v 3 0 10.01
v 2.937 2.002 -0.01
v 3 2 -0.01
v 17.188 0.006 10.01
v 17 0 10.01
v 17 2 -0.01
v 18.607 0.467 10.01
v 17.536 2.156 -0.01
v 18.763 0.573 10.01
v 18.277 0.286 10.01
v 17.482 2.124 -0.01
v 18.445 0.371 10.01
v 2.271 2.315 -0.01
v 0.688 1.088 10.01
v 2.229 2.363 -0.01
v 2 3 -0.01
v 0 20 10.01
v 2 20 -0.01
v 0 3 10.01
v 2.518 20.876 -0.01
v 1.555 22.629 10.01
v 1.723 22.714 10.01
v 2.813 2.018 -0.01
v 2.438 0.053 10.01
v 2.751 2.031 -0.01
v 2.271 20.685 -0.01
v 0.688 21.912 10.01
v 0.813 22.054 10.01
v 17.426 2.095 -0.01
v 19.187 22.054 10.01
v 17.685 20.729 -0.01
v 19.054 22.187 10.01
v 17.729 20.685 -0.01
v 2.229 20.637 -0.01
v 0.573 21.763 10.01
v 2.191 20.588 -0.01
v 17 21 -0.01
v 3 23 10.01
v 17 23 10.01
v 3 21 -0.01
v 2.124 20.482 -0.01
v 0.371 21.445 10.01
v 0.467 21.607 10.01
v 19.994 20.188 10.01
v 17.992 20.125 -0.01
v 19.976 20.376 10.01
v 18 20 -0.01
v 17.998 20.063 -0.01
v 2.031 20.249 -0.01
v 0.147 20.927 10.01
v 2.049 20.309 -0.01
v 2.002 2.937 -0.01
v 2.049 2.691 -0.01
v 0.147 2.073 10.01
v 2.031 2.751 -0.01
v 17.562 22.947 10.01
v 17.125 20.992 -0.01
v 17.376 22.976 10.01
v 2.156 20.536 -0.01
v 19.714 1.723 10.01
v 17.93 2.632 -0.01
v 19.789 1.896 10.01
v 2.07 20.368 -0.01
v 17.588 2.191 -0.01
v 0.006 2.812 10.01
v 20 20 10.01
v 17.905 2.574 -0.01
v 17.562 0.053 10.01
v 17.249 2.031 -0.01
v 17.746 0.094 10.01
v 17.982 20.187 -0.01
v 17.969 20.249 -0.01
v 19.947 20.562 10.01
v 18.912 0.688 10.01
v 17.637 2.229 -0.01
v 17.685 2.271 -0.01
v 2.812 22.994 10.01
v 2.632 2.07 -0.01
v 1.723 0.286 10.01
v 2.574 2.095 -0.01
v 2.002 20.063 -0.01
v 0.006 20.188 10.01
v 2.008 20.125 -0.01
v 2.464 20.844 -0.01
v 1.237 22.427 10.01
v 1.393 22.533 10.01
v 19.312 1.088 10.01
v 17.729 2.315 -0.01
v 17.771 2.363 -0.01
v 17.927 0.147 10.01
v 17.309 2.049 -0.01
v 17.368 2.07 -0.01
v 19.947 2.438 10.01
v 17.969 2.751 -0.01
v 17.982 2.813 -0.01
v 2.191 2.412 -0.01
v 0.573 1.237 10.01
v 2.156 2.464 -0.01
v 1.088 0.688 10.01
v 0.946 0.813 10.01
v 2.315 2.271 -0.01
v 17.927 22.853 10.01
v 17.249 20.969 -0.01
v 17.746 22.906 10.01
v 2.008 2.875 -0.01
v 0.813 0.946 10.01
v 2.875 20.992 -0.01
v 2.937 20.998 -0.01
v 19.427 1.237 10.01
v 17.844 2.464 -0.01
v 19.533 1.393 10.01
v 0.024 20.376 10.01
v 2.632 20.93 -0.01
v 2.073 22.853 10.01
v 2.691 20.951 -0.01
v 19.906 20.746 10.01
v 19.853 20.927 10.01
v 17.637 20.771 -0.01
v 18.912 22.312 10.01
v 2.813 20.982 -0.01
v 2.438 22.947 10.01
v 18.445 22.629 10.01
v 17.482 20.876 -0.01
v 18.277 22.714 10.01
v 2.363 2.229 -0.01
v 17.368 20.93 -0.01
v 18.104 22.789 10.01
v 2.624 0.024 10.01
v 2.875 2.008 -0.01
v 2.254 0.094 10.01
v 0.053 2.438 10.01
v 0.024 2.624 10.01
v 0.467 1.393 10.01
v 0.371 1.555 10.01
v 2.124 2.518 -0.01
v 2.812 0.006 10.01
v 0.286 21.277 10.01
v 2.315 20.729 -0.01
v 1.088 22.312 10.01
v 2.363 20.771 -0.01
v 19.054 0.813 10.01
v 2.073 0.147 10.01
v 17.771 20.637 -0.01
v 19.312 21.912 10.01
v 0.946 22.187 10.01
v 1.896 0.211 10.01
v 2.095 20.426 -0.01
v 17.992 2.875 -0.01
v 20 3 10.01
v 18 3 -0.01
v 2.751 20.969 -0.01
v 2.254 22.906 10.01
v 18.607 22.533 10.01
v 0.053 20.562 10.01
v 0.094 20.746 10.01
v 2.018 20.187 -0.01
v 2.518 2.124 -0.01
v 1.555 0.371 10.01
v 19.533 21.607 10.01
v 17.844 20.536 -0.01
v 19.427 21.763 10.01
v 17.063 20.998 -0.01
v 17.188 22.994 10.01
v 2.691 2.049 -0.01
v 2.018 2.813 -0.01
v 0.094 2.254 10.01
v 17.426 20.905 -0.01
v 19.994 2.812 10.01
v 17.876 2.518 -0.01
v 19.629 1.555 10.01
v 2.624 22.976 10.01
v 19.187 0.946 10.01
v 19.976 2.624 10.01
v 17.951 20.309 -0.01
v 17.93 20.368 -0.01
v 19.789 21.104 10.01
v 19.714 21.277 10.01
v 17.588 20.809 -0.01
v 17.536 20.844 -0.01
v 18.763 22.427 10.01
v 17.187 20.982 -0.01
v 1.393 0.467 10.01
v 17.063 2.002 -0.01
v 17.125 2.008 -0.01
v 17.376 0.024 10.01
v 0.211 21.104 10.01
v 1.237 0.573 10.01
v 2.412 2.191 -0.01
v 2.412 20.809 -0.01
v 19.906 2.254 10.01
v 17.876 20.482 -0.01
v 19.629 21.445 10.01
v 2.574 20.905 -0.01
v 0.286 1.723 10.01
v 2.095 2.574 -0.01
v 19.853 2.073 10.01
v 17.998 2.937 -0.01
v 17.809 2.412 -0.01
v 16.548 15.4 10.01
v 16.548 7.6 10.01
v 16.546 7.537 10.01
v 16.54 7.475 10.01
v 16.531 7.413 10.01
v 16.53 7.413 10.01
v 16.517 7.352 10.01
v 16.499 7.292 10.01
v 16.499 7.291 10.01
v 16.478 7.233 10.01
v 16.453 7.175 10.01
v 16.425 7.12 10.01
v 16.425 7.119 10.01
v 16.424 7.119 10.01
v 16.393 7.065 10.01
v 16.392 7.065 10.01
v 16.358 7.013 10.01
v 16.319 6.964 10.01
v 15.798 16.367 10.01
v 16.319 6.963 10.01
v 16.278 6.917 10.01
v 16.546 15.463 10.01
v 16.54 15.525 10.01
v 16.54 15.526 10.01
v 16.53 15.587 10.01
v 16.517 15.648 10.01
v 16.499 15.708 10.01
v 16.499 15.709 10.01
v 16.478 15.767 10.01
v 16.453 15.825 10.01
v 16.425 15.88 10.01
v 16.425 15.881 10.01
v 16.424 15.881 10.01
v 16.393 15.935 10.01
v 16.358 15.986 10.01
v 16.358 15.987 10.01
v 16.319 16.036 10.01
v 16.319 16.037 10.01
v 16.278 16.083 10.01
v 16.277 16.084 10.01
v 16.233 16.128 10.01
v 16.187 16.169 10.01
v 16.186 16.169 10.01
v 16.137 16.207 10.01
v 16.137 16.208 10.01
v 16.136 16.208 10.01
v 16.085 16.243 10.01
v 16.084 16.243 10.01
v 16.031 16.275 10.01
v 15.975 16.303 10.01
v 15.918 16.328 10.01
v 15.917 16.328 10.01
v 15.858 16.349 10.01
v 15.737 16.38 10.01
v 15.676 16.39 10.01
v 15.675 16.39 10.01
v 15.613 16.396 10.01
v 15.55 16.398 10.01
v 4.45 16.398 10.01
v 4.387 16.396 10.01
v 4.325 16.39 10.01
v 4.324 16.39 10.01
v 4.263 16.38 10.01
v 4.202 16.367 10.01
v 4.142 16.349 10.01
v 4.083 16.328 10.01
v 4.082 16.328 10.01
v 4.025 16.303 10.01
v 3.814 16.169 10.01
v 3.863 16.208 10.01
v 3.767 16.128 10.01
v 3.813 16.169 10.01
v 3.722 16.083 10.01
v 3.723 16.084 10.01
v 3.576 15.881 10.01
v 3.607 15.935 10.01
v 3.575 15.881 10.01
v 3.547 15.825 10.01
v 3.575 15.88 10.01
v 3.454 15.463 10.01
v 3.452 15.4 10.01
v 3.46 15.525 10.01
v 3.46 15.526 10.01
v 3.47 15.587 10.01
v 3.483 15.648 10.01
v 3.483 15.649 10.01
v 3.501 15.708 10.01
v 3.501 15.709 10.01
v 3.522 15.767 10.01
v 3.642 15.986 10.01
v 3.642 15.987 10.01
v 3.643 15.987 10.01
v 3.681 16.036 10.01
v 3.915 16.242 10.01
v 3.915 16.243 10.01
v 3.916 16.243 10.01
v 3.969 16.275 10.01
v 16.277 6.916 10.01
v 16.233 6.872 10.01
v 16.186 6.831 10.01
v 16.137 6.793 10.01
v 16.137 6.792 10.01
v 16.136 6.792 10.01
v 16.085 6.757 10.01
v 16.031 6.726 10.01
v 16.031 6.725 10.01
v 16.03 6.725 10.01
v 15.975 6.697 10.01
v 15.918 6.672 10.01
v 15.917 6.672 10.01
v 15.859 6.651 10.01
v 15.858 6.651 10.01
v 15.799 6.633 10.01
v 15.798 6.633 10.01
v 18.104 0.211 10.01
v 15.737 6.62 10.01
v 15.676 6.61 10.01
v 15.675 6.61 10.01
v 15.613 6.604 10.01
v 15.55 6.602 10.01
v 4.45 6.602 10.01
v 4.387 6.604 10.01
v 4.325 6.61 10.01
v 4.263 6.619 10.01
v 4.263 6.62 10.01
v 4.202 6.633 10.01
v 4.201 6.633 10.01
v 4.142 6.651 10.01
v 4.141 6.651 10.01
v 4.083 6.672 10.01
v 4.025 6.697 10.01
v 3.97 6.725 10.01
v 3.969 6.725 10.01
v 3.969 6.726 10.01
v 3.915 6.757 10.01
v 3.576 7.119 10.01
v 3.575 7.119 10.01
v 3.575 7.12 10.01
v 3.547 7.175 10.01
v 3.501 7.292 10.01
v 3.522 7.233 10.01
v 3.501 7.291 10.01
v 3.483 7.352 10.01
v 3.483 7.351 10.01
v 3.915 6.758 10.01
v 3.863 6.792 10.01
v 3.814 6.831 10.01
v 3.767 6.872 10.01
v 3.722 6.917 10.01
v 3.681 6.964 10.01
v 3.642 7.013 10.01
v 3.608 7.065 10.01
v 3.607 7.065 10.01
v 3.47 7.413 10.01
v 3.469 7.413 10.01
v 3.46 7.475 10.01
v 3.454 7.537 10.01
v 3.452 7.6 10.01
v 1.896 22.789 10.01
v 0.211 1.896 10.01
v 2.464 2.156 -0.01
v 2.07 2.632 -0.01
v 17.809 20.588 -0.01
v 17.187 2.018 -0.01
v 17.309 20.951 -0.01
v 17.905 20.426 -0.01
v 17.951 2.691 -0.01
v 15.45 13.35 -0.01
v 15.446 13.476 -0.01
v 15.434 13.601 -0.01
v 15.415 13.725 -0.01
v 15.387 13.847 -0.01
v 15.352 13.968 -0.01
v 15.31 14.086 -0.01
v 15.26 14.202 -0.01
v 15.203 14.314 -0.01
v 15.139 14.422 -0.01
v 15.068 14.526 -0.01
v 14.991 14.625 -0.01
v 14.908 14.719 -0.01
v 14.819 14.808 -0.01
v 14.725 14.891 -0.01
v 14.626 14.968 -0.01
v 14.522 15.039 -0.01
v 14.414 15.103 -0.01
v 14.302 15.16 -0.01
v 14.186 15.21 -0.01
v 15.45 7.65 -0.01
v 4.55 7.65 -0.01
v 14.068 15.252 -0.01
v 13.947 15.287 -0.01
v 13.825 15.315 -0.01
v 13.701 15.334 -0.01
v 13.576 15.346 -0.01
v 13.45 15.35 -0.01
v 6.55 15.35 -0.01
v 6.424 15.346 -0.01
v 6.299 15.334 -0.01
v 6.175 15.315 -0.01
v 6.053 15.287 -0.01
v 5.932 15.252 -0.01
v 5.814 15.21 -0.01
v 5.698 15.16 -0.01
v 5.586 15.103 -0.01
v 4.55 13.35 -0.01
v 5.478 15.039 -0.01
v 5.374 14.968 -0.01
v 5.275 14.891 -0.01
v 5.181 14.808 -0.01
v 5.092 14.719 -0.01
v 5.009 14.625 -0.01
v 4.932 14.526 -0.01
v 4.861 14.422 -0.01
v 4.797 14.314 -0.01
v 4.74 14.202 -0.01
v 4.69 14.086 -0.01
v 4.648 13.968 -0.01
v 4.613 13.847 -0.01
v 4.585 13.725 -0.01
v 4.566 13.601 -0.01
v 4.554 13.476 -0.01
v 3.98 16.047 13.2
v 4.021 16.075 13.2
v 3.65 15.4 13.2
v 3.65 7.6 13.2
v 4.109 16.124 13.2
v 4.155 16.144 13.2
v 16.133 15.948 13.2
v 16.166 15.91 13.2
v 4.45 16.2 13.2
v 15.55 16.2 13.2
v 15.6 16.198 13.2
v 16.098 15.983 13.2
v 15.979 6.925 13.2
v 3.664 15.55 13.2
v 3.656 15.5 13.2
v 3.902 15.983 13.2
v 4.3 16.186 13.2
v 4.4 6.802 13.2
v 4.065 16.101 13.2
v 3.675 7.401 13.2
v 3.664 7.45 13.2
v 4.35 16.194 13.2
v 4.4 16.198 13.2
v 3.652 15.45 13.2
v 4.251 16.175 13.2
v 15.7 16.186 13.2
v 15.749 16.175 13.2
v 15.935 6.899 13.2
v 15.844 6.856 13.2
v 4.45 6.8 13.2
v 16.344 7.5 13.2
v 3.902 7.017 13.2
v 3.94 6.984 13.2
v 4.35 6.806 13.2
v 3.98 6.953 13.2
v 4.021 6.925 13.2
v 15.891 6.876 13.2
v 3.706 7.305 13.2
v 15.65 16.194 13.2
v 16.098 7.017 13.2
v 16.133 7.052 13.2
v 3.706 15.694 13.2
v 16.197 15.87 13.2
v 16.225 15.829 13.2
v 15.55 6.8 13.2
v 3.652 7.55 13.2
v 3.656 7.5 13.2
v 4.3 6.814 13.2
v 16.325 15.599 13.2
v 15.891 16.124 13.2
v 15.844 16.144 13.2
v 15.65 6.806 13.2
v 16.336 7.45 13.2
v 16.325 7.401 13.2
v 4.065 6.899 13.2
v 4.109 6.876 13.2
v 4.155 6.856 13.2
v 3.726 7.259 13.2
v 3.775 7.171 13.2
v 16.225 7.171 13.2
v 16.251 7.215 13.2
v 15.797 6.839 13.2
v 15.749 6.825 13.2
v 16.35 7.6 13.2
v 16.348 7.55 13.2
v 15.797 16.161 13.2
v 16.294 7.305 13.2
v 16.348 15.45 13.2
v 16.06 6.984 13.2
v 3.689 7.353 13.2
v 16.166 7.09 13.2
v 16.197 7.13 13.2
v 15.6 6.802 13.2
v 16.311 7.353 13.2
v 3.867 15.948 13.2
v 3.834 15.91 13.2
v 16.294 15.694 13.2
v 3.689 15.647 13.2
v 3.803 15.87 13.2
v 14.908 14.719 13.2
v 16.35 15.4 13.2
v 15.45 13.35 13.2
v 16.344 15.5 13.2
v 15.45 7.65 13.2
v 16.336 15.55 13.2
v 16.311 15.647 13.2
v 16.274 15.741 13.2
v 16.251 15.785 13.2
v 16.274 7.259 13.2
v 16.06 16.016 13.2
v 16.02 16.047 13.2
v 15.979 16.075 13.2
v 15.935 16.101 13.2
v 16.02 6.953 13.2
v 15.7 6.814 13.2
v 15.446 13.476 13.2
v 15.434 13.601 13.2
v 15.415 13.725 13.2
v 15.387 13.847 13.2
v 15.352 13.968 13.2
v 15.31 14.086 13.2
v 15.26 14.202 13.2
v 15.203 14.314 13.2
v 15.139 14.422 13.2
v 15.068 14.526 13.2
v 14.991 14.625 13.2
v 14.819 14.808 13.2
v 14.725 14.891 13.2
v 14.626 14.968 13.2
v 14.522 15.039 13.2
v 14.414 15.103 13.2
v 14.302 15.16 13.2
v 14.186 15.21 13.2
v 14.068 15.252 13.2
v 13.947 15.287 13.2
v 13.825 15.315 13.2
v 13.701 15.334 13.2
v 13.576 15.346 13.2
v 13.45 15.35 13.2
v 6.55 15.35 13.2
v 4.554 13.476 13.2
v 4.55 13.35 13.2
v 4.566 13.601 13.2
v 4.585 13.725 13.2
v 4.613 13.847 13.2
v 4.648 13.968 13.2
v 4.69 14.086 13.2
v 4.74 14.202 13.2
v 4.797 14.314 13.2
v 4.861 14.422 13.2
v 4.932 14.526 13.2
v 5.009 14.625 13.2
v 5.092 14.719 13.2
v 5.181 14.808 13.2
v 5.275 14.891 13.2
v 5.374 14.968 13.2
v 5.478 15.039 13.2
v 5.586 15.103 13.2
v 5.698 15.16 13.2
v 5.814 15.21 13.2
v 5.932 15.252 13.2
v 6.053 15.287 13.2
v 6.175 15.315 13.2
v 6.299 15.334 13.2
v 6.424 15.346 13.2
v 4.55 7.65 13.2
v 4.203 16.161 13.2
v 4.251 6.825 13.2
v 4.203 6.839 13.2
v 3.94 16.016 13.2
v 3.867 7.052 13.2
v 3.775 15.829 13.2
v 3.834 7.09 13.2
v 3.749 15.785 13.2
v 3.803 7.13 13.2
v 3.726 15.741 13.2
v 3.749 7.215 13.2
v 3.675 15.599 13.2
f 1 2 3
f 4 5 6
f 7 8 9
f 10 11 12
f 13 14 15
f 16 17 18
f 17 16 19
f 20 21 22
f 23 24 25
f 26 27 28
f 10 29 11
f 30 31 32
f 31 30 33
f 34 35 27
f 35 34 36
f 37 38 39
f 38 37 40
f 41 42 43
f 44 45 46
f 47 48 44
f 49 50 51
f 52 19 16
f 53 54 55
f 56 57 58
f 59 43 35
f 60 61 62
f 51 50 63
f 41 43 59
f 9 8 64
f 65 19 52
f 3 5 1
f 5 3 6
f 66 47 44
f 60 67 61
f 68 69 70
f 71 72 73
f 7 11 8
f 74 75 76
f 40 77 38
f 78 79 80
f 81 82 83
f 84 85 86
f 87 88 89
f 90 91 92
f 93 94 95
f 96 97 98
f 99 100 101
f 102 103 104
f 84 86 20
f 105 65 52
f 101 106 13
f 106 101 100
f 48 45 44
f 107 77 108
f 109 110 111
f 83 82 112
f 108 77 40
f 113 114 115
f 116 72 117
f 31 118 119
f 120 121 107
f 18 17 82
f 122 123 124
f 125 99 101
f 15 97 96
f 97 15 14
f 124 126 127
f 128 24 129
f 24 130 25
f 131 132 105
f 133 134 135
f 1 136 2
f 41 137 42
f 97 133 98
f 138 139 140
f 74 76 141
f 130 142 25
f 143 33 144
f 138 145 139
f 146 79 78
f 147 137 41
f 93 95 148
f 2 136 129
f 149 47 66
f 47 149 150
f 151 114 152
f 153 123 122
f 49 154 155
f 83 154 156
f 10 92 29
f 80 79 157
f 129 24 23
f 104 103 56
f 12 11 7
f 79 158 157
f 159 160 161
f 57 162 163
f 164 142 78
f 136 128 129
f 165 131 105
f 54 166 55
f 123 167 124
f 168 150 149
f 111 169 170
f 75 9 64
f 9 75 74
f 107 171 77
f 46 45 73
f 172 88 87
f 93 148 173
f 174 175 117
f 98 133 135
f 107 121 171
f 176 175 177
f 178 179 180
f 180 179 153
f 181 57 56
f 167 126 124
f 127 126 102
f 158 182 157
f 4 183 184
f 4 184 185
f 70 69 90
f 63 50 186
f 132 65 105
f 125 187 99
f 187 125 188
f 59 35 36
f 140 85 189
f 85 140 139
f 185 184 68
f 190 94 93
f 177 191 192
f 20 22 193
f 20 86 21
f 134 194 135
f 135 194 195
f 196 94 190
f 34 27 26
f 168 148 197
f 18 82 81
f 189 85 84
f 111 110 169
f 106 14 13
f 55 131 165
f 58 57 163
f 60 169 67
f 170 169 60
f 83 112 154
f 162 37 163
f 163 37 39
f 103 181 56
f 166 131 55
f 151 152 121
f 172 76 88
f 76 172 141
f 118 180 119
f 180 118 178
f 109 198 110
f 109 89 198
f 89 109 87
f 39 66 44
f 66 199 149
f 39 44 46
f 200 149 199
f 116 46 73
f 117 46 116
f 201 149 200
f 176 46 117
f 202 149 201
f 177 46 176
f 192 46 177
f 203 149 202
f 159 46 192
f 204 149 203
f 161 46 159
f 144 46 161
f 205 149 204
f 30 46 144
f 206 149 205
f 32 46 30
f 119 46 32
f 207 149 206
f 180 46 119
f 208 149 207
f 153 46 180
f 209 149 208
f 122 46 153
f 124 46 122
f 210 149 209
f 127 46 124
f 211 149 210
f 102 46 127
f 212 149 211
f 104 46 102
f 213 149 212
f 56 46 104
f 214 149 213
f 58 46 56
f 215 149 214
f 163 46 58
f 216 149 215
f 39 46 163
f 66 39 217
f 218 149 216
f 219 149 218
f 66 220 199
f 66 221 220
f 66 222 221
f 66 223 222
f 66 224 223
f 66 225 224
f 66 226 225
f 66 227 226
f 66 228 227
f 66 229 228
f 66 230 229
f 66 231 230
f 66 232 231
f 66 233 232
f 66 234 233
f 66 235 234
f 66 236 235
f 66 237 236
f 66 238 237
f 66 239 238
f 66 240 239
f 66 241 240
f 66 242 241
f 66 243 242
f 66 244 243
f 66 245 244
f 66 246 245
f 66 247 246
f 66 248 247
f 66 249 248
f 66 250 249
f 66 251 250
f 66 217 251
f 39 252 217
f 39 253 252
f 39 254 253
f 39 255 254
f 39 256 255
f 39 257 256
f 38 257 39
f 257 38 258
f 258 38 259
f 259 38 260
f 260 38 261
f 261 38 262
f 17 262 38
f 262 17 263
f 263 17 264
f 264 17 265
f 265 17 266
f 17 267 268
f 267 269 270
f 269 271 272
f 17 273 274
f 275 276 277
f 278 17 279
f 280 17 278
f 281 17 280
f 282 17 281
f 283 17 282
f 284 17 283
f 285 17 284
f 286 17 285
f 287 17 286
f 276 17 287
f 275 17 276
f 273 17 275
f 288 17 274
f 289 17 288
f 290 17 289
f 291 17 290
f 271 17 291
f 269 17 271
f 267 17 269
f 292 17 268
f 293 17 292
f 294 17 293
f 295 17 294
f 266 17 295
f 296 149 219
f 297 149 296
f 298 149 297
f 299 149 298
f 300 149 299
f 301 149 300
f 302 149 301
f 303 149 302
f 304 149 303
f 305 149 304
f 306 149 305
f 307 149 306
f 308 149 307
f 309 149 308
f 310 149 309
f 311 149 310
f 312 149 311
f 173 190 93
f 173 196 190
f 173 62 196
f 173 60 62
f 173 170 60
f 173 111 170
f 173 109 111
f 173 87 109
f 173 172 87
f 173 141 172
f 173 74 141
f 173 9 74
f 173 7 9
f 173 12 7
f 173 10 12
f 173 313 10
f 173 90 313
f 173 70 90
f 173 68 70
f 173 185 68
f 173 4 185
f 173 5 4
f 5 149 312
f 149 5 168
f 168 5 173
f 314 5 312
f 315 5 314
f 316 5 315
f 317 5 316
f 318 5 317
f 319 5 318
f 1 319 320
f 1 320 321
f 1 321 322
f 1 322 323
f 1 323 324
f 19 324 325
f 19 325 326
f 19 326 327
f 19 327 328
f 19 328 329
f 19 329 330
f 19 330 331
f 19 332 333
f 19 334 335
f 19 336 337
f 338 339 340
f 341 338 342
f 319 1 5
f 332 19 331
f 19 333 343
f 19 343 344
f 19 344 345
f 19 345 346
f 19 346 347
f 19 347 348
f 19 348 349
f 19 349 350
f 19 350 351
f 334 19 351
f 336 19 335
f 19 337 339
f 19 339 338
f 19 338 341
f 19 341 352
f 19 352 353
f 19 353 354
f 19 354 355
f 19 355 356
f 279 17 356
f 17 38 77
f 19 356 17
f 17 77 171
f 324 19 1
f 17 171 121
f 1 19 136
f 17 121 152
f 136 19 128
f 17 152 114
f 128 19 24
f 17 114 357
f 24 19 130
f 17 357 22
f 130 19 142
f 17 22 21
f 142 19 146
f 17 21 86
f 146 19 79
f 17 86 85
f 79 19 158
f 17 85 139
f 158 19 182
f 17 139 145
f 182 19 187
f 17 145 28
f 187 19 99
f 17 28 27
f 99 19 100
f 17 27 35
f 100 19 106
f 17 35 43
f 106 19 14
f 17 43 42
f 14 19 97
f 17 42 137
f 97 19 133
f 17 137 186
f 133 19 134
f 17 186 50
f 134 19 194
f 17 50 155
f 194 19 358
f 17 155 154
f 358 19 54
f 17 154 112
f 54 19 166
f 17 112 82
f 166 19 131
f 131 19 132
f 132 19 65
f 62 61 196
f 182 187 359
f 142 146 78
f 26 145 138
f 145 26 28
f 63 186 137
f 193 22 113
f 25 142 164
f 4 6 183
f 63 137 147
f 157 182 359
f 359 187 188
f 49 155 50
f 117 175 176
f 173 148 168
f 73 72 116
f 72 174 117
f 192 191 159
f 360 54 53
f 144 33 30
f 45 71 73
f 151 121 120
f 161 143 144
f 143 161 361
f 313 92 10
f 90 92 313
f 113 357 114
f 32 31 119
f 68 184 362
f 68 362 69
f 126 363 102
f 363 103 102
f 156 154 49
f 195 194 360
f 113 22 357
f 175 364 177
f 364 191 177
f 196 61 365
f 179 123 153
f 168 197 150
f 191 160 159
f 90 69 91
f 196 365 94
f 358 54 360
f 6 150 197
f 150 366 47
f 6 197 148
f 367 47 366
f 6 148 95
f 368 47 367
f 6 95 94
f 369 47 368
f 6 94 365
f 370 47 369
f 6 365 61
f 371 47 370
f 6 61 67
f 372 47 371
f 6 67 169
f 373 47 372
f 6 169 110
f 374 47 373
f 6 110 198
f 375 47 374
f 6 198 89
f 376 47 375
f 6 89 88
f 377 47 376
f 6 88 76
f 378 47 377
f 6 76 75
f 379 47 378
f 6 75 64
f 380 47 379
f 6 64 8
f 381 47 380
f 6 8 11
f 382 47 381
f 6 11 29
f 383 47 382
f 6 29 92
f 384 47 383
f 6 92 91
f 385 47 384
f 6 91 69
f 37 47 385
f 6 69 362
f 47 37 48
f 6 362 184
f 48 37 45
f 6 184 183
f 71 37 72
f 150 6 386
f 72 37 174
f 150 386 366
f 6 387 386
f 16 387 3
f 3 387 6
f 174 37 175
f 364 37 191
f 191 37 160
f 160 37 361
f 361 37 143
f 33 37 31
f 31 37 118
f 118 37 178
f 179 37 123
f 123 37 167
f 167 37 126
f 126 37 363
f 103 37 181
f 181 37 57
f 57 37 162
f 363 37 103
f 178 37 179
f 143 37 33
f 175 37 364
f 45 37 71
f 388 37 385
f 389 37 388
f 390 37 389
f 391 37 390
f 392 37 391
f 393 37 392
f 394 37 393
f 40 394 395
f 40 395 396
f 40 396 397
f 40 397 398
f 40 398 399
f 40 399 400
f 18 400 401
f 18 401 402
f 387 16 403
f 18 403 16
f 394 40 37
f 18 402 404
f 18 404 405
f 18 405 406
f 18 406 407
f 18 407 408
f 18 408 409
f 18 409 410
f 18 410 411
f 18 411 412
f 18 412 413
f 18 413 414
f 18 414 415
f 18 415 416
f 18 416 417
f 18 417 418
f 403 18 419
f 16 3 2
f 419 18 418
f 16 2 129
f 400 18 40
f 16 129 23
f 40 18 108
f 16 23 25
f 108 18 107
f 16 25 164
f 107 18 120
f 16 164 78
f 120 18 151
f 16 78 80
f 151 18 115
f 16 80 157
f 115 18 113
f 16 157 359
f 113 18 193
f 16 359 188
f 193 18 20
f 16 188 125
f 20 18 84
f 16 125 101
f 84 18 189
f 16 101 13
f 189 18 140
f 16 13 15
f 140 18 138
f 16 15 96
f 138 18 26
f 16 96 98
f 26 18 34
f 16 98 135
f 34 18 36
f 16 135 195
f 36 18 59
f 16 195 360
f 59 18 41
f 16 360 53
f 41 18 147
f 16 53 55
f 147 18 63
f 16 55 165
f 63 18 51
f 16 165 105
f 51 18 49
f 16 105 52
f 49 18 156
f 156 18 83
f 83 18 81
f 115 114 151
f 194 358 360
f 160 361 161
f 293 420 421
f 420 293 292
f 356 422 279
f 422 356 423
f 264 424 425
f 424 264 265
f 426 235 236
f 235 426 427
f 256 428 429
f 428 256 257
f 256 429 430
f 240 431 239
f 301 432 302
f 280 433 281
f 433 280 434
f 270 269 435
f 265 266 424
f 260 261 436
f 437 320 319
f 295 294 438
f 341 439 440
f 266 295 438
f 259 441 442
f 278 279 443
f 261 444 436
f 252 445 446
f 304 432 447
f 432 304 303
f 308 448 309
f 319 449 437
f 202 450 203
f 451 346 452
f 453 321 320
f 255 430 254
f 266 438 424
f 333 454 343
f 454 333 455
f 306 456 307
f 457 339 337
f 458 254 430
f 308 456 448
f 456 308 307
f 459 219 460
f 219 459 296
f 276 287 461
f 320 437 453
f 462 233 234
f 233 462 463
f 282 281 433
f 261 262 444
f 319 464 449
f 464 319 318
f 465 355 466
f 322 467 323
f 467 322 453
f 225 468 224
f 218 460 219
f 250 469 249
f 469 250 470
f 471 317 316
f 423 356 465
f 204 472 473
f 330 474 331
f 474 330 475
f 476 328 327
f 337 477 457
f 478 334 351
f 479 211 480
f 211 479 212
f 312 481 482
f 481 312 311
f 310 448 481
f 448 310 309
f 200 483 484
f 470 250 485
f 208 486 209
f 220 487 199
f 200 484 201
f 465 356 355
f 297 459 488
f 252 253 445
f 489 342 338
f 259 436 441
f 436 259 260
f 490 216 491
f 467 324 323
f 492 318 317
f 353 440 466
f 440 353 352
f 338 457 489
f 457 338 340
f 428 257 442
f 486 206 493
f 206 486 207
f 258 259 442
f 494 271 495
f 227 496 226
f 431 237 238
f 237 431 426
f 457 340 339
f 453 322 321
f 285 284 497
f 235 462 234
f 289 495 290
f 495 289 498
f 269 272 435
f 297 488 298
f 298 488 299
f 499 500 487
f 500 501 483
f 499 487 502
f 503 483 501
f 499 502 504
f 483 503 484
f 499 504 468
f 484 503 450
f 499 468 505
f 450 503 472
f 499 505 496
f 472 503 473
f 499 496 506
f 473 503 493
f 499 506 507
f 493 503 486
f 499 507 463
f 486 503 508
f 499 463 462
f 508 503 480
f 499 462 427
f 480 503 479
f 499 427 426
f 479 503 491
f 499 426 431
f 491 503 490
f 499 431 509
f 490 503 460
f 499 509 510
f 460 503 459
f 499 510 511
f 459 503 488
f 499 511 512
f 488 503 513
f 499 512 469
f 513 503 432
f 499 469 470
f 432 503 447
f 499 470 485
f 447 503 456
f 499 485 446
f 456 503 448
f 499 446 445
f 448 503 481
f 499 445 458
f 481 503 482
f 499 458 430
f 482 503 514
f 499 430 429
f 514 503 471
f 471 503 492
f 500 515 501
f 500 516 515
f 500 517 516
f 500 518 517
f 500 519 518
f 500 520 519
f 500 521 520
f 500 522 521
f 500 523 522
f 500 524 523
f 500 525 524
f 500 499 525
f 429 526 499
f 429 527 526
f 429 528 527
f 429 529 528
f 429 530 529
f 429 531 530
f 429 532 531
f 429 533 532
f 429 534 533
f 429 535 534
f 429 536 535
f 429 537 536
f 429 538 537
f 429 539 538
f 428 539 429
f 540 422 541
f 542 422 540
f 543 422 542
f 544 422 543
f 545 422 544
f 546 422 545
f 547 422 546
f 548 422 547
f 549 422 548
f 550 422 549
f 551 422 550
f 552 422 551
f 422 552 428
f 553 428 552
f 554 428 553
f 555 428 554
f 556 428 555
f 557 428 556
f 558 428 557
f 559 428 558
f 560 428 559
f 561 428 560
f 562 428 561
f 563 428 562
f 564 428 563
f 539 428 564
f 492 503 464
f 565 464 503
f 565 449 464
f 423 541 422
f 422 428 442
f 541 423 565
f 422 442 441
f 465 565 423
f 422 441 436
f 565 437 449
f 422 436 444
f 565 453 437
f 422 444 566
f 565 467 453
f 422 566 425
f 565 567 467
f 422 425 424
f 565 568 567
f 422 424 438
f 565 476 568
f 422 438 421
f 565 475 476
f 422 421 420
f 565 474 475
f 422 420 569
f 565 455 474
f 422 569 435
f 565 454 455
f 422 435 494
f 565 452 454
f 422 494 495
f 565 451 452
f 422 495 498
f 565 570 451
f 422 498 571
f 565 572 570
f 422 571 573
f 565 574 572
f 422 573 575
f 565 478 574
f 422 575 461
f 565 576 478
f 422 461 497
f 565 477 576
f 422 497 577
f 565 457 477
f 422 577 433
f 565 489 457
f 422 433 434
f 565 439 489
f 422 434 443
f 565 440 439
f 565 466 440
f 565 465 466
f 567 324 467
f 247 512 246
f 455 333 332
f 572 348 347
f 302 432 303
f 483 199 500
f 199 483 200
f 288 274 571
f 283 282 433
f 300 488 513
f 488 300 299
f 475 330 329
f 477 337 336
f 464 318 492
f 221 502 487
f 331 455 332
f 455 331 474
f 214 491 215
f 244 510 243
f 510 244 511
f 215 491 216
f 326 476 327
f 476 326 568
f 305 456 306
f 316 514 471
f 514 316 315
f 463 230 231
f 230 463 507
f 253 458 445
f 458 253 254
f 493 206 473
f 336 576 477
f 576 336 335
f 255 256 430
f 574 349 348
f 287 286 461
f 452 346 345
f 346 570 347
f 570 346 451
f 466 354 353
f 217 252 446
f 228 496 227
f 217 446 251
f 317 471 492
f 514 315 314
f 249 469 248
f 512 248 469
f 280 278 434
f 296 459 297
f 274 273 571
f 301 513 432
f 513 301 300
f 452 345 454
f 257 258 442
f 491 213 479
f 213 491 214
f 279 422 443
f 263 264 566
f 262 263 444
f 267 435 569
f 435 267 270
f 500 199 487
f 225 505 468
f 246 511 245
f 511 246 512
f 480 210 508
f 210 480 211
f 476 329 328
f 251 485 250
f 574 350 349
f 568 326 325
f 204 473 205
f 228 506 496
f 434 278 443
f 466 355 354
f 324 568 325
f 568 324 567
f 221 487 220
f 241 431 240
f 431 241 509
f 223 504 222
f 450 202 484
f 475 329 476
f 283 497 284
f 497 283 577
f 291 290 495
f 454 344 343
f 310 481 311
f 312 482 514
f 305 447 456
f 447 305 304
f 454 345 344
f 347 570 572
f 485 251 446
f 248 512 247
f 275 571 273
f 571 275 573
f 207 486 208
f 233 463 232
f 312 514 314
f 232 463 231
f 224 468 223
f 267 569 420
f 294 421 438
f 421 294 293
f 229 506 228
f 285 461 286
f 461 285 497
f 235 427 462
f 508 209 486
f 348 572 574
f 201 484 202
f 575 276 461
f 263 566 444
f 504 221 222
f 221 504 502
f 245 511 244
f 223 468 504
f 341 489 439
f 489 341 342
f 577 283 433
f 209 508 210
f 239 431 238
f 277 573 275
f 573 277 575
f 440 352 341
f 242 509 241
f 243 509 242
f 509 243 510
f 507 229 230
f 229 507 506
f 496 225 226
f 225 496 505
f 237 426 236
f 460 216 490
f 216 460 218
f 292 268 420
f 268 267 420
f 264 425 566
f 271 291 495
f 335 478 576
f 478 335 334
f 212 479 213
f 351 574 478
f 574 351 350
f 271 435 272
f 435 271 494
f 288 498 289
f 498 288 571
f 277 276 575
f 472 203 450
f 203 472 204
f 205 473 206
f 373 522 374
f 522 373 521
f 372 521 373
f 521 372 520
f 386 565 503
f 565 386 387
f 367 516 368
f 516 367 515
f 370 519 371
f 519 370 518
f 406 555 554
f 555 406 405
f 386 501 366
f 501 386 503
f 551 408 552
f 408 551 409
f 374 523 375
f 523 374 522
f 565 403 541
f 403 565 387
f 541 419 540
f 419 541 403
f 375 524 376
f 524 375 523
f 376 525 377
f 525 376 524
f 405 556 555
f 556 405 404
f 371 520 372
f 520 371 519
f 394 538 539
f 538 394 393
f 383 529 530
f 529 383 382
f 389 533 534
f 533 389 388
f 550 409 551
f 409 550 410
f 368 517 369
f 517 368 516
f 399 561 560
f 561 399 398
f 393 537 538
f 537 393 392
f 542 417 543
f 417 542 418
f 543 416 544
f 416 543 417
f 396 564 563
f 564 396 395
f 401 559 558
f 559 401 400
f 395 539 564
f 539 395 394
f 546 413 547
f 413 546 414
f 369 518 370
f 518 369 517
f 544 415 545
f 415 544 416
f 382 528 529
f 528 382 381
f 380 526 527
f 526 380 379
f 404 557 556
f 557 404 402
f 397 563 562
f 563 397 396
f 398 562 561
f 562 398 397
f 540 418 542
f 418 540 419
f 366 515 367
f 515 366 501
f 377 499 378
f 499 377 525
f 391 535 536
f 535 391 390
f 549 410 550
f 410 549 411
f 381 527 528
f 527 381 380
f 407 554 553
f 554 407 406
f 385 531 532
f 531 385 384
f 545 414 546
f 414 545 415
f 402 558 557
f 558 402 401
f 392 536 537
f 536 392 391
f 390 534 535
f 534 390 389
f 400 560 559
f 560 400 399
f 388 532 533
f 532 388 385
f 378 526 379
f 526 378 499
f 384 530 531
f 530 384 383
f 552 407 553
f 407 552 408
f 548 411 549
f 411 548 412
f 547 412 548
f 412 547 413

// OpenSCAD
/* GNU GPL */
/* [Size] */
// Size of the shell
CUBE_SIZE = [20, 23, 10];
// Size of the peg which goes into the printer
PEG_SIZE  = [13.1, 9.8, 3.2];
// Size of USB socket
USB_SIZE = [10.9, 7.7];

module parameters_stop(){}

/*
DELTA is used to sink an object into the parent object to remediate
non-manifoldness which exists because of rounding errors.
*/
DELTA = 0.01;

/* Just aliases for indices. */
X = 0;
Y = 1;
Z = 2;

REAL_USB = [USB_SIZE[0], USB_SIZE[1], CUBE_SIZE[Z] + PEG_SIZE[Z] + DELTA * 2];

$fn = 100;

/* Utility modules */
function bit_get(num, bitpos) = floor(num / pow(2, bitpos)) % 2;

module rounded_cube(dim, r, r2=undef)
{
    hull() for(i = [0 : 3])
    {
	X_bit = bit_get(i, 0);
	Y = bit_get(i, 1);
	OFF = r2==undef ? r : max(r, r2);

	translate([dim[0] * X_bit + pow(-1, X_bit) * OFF, dim[1] * Y + pow(-1, Y) * OFF, -DELTA])
	{
	    if(r2==undef)
	    {
		cylinder(r=r, h=dim[2] + DELTA * 2);
	    } else {
		cylinder(r1=r, r2 = r2, h=dim[2] + DELTA * 2);
	    }
	}
    }
}

module center_at(outer, inner)
{
    translate([(outer[0] - inner[0]) / 2, (outer[1] - inner[1]) / 2, 0])
    {
	children();
    }
}

module up(what)
{
    translate([0, 0, what])
    {
	children();
    }
}

module down(what)
{
    translate([0, 0, -what])
    {
	children();
    }
}

module above(what)
{
    up(what[Z] - DELTA)
    {
	children();
    }
}

/* Real object 'meat'. */
module usb_hole(dim, r)
{
    H = dim[2] + DELTA * 2;

    down(DELTA) hull()
    {
	translate([             0,          0, 0]) cube([r * 2, r * 2, H]);
	translate([dim[0] - r * 2,          0, 0]) cube([r * 2, r * 2, H]);
	translate([         0 + r, dim[1] - r, 0]) cylinder(r=r, h=H);
	translate([    dim[0] - r, dim[1] - r, 0]) cylinder(r=r, h=H);
    }
}

module usb_holder()
{
    difference()
    {
	union()
	{
	    rounded_cube(CUBE_SIZE, 1, r2=3);
	    above(CUBE_SIZE) center_at(CUBE_SIZE, PEG_SIZE) rounded_cube(PEG_SIZE, 1, r2=0.8);
	}
	down(DELTA) center_at(CUBE_SIZE, REAL_USB) usb_hole(REAL_USB, 2);
    }
}

usb_holder();
